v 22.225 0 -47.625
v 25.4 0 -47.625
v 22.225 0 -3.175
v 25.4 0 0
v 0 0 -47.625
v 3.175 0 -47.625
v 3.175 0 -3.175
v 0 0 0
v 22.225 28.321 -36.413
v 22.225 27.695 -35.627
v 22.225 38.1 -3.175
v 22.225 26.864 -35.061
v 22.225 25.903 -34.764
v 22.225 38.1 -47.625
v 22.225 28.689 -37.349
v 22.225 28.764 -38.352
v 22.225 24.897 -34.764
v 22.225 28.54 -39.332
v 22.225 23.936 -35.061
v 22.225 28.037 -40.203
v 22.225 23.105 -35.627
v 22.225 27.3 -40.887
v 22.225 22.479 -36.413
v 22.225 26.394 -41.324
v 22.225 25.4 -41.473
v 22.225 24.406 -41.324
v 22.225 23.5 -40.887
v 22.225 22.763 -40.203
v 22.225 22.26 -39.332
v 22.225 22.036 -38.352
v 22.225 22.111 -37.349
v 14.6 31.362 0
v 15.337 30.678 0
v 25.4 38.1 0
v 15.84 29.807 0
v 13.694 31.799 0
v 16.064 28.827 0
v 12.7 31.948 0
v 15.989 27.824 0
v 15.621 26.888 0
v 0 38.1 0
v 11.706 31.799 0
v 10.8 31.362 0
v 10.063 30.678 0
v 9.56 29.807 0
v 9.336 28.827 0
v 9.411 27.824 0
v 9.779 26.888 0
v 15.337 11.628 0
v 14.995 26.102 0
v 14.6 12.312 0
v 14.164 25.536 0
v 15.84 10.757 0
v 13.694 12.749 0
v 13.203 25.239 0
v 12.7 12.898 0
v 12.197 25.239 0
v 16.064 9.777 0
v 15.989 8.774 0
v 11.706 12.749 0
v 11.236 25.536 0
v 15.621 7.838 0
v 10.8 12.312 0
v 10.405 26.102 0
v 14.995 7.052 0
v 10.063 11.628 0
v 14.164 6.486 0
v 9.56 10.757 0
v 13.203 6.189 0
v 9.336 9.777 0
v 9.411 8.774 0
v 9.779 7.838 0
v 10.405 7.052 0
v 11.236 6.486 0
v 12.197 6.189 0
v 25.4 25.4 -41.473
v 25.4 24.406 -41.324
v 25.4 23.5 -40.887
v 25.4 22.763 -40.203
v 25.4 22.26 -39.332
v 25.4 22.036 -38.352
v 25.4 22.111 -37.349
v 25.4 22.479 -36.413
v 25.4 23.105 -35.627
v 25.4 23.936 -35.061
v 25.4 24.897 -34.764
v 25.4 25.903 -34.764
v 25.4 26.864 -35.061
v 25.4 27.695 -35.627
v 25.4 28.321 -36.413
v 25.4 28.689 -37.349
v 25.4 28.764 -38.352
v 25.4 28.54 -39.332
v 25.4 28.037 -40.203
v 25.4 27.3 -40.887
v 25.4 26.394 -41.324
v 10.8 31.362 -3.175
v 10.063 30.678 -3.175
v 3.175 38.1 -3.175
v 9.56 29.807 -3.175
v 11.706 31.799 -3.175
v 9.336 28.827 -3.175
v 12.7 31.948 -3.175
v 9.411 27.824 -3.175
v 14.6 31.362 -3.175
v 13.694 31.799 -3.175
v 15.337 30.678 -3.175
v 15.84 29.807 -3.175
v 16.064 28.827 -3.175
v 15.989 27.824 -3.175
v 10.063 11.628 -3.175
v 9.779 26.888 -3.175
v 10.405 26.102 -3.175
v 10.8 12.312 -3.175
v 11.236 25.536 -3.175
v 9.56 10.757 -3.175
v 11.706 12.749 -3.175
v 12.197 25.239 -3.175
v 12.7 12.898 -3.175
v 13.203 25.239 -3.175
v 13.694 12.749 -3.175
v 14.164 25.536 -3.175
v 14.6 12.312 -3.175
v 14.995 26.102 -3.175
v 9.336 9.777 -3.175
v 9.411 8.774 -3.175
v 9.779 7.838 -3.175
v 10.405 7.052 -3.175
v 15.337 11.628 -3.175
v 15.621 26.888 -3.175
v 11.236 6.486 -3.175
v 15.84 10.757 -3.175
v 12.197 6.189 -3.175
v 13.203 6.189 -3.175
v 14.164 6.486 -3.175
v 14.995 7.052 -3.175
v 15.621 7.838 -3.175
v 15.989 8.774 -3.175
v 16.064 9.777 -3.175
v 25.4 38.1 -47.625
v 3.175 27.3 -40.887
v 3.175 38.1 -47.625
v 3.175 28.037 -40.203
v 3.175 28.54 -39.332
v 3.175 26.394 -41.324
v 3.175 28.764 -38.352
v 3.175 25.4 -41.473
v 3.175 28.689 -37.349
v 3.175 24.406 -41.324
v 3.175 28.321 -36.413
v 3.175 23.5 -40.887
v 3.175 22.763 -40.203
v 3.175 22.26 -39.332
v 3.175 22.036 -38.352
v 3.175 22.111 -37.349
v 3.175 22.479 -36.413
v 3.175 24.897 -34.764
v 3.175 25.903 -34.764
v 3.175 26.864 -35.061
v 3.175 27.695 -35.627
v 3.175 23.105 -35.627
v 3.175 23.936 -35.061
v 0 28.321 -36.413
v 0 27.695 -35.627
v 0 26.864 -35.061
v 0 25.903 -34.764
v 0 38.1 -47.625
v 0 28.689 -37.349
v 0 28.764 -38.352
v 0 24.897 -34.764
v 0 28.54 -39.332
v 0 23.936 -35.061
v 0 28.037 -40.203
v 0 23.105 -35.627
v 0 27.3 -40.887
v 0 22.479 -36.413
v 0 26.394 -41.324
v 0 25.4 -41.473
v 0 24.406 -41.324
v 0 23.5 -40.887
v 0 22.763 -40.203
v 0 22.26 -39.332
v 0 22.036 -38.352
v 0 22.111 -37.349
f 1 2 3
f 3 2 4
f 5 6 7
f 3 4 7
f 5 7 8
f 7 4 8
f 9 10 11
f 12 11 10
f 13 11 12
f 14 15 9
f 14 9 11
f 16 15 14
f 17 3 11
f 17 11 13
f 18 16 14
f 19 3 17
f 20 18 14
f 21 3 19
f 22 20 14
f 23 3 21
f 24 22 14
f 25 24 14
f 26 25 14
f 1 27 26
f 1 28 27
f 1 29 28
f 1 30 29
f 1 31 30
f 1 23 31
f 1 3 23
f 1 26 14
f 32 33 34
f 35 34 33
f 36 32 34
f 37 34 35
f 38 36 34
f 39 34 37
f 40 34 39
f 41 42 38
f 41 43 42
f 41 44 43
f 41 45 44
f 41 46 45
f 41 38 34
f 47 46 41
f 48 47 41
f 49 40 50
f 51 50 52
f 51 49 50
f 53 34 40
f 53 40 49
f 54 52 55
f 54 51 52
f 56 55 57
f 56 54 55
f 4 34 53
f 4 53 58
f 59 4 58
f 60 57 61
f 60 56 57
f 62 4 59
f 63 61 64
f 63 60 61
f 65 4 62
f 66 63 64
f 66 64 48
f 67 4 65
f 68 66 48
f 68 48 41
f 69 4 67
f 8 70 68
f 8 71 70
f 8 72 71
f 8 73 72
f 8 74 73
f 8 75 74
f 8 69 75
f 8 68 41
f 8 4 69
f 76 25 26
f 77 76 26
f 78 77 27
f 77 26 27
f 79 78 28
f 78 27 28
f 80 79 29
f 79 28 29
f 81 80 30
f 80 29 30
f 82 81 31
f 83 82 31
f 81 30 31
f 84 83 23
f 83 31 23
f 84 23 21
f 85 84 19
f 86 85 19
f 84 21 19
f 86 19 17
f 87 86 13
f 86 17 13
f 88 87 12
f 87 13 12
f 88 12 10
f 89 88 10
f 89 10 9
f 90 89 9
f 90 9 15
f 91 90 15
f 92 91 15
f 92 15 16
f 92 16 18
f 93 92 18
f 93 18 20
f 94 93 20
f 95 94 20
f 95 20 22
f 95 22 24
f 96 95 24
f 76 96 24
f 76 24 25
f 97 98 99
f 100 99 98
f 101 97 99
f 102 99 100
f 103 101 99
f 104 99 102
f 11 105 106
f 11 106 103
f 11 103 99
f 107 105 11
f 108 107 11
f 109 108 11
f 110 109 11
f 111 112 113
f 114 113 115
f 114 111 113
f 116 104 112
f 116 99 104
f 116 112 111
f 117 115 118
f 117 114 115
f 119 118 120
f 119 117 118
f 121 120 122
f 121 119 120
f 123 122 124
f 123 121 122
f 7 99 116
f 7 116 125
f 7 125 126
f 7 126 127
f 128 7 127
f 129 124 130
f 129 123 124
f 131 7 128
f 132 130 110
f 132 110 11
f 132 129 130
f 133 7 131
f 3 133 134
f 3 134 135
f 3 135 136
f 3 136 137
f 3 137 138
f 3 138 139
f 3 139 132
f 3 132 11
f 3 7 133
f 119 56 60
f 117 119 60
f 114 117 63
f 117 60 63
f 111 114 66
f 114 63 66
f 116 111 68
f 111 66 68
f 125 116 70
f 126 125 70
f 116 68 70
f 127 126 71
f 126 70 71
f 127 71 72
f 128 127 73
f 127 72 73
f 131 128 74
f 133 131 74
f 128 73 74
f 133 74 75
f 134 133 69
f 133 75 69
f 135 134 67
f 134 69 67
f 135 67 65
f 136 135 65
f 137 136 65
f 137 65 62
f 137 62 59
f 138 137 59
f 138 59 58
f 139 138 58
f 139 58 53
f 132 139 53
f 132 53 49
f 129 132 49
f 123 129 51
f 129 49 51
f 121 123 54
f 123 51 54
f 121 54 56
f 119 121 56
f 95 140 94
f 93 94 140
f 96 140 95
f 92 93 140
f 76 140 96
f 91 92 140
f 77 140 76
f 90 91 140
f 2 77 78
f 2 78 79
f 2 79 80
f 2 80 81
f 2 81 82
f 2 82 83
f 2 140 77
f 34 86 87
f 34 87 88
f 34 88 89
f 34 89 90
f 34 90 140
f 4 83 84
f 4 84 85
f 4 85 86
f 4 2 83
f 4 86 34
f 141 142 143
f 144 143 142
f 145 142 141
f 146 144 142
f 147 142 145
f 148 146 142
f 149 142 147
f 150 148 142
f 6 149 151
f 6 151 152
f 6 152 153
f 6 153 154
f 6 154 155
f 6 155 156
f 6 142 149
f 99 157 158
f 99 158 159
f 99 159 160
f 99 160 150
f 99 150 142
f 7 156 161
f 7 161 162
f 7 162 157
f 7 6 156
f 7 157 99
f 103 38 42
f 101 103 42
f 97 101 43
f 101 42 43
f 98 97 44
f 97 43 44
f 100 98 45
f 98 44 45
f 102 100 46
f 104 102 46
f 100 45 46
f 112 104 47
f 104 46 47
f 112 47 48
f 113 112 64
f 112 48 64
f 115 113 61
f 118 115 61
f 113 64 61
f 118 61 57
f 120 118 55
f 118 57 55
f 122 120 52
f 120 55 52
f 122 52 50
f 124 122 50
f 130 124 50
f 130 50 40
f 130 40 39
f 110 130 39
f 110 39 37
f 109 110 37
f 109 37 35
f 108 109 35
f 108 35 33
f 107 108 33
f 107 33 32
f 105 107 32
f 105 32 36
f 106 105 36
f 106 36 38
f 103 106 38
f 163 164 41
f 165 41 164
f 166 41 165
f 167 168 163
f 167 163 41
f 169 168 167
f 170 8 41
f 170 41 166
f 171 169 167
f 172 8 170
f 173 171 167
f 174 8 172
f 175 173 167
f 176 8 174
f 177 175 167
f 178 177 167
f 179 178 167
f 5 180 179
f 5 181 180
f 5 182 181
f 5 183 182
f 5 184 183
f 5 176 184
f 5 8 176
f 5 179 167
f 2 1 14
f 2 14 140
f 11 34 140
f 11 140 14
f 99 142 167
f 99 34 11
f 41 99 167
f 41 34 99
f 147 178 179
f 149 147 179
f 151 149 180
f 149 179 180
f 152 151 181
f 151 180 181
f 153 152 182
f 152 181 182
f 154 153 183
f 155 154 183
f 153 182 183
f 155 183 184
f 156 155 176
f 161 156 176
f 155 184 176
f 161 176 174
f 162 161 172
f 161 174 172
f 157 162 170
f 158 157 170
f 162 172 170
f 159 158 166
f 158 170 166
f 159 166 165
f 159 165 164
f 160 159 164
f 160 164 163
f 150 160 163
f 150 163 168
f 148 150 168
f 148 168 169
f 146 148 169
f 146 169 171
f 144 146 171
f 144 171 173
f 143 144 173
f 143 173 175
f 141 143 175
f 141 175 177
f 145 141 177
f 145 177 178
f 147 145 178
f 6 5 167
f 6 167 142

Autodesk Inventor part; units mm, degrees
ref_plane "YZ Plane" through (0, 0, 0) normal (1, 0, 0) x (0, 1, 0)
ref_plane "XZ Plane" through (0, 0, 0) normal (0, 1, 0) x (-1, 0, 0)
ref_plane "XY Plane" through (0, 0, 0) normal (0, 0, 1) x (1, 0, 0)
sketch "Sketch1" plane through (0, 0, 0) normal (0, 1, 0) x (-1, 0, 0)
  line L0 (0, 0) -> (0, -47.625)
  line L1 (0, -47.625) -> (-3.175, -47.625)
  line L2 (-3.175, -47.625) -> (-3.175, -3.175)
  line L3 (-3.175, -3.175) -> (-22.225, -3.175)
  line L4 (-22.225, -3.175) -> (-22.225, -47.625)
  line L5 (-22.225, -47.625) -> (-25.4, -47.625)
  line L6 (-25.4, -47.625) -> (-25.4, 0)
  line L7 (-25.4, 0) -> (0, 0)
  dimension "d0" = 3.175
  dimension "d1" = 47.625
  dimension "d2" = 3.175
  dimension "d3" = 25.4
  dimension "d4" = 3.175
extrude "Extrusion1" add sketch "Sketch1" along normal blind 38.1
sketch "Sketch2" plane through (25.4, 0, 0) normal (1, 0, 0) x (0, 0, -1)
  line L0 (47.625, 0) -> (47.625, 38.1) projected
  line L1 (47.625, 0) -> (0, 0) projected
  point P0 (38.1, 25.4)
  dimension "d7" = 9.525
  dimension "d8" = 25.4
hole "Hole1" at (25.4, 25.4, -38.1) direction (-1, 0, 0) diameter 6.7469 end through all
sketch "Sketch3" plane through (22.225, 0, -3.175) normal (0, 0, -1) x (-1, 0, 0)
  line L0 (-3.175, 0) -> (22.225, 0) projected
  line L1 (0, 38.1) -> (19.05, 38.1) projected
  line L2 (22.225, 0) -> (22.225, 38.1) projected
  line L3 (-3.175, 0) -> (-3.175, 38.1) projected
  point P0 (9.525, 9.525)
  point P1 (9.525, 28.575)
  point P2 (22.225, 31.75)
  point P3 (-3.175, 31.75)
  dimension "d19" = 9.525
  dimension "d20" = 9.525
  dimension "d21" = 12.7
  dimension "d22" = 12.7
hole "Hole2" at (12.7, 9.525, -3.175) at (12.7, 28.575, -3.175) direction (0, 0, 1) diameter 6.7469 end through all
properties part number "15102898-16-P-0311" material "Aluminum 6061"
